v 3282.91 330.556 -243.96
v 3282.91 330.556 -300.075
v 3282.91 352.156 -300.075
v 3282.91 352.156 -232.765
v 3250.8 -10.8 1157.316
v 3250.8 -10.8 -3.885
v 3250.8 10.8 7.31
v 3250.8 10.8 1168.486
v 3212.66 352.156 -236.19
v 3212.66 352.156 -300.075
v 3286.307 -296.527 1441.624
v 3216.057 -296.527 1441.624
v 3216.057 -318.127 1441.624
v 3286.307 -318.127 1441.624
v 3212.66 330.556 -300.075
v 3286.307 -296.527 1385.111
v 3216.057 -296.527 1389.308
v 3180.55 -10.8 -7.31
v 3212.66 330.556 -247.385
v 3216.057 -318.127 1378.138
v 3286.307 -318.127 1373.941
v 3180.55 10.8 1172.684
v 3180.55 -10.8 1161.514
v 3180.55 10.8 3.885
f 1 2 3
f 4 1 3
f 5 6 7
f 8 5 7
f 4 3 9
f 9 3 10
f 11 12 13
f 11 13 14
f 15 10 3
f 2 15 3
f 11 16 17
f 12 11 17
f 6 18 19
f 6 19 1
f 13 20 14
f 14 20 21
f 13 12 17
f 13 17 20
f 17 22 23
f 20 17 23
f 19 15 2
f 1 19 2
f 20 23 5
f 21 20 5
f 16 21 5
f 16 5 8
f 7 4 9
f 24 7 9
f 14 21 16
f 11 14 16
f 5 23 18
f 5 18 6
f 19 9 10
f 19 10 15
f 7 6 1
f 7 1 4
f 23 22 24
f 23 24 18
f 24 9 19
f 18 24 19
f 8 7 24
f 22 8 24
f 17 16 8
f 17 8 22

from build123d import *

# Parameters (mm, degrees)
SKETCH2_W = 70.25
SKETCH2_H = 21.6


with BuildPart() as part:
    # Sweep1: sweep along a curve in space
    with BuildLine() as sweep1_path:
        Line((3251.181818755, -307.327166096, 1441.624252092), (3251.181818755, -307.327166096, 1381.624252092))
        Line((3215.675, 0, 1165), (3251.181818755, -307.327166096, 1381.624252092))
        Line((3215.675, 0, 1165), (3215.675, 0, 0))
        Line((3215.675, 0, 0), (3247.785290657, 341.355989282, -240.075201436))
        Line((3247.785290657, 341.355989282, -240.075201436), (3247.785290657, 341.355989282, -300.075201436))
    # Sketch2 → Sweep1 (sweep)
    with BuildSketch(Plane(origin=(3247.785290657, 341.355989282, -300.075201436), x_dir=(1, 0, 0), z_dir=(0, 0, 1))):
        Rectangle(SKETCH2_W, SKETCH2_H)
    sweep(path=sweep1_path.line, transition=Transition.RIGHT)


solid = part.part
